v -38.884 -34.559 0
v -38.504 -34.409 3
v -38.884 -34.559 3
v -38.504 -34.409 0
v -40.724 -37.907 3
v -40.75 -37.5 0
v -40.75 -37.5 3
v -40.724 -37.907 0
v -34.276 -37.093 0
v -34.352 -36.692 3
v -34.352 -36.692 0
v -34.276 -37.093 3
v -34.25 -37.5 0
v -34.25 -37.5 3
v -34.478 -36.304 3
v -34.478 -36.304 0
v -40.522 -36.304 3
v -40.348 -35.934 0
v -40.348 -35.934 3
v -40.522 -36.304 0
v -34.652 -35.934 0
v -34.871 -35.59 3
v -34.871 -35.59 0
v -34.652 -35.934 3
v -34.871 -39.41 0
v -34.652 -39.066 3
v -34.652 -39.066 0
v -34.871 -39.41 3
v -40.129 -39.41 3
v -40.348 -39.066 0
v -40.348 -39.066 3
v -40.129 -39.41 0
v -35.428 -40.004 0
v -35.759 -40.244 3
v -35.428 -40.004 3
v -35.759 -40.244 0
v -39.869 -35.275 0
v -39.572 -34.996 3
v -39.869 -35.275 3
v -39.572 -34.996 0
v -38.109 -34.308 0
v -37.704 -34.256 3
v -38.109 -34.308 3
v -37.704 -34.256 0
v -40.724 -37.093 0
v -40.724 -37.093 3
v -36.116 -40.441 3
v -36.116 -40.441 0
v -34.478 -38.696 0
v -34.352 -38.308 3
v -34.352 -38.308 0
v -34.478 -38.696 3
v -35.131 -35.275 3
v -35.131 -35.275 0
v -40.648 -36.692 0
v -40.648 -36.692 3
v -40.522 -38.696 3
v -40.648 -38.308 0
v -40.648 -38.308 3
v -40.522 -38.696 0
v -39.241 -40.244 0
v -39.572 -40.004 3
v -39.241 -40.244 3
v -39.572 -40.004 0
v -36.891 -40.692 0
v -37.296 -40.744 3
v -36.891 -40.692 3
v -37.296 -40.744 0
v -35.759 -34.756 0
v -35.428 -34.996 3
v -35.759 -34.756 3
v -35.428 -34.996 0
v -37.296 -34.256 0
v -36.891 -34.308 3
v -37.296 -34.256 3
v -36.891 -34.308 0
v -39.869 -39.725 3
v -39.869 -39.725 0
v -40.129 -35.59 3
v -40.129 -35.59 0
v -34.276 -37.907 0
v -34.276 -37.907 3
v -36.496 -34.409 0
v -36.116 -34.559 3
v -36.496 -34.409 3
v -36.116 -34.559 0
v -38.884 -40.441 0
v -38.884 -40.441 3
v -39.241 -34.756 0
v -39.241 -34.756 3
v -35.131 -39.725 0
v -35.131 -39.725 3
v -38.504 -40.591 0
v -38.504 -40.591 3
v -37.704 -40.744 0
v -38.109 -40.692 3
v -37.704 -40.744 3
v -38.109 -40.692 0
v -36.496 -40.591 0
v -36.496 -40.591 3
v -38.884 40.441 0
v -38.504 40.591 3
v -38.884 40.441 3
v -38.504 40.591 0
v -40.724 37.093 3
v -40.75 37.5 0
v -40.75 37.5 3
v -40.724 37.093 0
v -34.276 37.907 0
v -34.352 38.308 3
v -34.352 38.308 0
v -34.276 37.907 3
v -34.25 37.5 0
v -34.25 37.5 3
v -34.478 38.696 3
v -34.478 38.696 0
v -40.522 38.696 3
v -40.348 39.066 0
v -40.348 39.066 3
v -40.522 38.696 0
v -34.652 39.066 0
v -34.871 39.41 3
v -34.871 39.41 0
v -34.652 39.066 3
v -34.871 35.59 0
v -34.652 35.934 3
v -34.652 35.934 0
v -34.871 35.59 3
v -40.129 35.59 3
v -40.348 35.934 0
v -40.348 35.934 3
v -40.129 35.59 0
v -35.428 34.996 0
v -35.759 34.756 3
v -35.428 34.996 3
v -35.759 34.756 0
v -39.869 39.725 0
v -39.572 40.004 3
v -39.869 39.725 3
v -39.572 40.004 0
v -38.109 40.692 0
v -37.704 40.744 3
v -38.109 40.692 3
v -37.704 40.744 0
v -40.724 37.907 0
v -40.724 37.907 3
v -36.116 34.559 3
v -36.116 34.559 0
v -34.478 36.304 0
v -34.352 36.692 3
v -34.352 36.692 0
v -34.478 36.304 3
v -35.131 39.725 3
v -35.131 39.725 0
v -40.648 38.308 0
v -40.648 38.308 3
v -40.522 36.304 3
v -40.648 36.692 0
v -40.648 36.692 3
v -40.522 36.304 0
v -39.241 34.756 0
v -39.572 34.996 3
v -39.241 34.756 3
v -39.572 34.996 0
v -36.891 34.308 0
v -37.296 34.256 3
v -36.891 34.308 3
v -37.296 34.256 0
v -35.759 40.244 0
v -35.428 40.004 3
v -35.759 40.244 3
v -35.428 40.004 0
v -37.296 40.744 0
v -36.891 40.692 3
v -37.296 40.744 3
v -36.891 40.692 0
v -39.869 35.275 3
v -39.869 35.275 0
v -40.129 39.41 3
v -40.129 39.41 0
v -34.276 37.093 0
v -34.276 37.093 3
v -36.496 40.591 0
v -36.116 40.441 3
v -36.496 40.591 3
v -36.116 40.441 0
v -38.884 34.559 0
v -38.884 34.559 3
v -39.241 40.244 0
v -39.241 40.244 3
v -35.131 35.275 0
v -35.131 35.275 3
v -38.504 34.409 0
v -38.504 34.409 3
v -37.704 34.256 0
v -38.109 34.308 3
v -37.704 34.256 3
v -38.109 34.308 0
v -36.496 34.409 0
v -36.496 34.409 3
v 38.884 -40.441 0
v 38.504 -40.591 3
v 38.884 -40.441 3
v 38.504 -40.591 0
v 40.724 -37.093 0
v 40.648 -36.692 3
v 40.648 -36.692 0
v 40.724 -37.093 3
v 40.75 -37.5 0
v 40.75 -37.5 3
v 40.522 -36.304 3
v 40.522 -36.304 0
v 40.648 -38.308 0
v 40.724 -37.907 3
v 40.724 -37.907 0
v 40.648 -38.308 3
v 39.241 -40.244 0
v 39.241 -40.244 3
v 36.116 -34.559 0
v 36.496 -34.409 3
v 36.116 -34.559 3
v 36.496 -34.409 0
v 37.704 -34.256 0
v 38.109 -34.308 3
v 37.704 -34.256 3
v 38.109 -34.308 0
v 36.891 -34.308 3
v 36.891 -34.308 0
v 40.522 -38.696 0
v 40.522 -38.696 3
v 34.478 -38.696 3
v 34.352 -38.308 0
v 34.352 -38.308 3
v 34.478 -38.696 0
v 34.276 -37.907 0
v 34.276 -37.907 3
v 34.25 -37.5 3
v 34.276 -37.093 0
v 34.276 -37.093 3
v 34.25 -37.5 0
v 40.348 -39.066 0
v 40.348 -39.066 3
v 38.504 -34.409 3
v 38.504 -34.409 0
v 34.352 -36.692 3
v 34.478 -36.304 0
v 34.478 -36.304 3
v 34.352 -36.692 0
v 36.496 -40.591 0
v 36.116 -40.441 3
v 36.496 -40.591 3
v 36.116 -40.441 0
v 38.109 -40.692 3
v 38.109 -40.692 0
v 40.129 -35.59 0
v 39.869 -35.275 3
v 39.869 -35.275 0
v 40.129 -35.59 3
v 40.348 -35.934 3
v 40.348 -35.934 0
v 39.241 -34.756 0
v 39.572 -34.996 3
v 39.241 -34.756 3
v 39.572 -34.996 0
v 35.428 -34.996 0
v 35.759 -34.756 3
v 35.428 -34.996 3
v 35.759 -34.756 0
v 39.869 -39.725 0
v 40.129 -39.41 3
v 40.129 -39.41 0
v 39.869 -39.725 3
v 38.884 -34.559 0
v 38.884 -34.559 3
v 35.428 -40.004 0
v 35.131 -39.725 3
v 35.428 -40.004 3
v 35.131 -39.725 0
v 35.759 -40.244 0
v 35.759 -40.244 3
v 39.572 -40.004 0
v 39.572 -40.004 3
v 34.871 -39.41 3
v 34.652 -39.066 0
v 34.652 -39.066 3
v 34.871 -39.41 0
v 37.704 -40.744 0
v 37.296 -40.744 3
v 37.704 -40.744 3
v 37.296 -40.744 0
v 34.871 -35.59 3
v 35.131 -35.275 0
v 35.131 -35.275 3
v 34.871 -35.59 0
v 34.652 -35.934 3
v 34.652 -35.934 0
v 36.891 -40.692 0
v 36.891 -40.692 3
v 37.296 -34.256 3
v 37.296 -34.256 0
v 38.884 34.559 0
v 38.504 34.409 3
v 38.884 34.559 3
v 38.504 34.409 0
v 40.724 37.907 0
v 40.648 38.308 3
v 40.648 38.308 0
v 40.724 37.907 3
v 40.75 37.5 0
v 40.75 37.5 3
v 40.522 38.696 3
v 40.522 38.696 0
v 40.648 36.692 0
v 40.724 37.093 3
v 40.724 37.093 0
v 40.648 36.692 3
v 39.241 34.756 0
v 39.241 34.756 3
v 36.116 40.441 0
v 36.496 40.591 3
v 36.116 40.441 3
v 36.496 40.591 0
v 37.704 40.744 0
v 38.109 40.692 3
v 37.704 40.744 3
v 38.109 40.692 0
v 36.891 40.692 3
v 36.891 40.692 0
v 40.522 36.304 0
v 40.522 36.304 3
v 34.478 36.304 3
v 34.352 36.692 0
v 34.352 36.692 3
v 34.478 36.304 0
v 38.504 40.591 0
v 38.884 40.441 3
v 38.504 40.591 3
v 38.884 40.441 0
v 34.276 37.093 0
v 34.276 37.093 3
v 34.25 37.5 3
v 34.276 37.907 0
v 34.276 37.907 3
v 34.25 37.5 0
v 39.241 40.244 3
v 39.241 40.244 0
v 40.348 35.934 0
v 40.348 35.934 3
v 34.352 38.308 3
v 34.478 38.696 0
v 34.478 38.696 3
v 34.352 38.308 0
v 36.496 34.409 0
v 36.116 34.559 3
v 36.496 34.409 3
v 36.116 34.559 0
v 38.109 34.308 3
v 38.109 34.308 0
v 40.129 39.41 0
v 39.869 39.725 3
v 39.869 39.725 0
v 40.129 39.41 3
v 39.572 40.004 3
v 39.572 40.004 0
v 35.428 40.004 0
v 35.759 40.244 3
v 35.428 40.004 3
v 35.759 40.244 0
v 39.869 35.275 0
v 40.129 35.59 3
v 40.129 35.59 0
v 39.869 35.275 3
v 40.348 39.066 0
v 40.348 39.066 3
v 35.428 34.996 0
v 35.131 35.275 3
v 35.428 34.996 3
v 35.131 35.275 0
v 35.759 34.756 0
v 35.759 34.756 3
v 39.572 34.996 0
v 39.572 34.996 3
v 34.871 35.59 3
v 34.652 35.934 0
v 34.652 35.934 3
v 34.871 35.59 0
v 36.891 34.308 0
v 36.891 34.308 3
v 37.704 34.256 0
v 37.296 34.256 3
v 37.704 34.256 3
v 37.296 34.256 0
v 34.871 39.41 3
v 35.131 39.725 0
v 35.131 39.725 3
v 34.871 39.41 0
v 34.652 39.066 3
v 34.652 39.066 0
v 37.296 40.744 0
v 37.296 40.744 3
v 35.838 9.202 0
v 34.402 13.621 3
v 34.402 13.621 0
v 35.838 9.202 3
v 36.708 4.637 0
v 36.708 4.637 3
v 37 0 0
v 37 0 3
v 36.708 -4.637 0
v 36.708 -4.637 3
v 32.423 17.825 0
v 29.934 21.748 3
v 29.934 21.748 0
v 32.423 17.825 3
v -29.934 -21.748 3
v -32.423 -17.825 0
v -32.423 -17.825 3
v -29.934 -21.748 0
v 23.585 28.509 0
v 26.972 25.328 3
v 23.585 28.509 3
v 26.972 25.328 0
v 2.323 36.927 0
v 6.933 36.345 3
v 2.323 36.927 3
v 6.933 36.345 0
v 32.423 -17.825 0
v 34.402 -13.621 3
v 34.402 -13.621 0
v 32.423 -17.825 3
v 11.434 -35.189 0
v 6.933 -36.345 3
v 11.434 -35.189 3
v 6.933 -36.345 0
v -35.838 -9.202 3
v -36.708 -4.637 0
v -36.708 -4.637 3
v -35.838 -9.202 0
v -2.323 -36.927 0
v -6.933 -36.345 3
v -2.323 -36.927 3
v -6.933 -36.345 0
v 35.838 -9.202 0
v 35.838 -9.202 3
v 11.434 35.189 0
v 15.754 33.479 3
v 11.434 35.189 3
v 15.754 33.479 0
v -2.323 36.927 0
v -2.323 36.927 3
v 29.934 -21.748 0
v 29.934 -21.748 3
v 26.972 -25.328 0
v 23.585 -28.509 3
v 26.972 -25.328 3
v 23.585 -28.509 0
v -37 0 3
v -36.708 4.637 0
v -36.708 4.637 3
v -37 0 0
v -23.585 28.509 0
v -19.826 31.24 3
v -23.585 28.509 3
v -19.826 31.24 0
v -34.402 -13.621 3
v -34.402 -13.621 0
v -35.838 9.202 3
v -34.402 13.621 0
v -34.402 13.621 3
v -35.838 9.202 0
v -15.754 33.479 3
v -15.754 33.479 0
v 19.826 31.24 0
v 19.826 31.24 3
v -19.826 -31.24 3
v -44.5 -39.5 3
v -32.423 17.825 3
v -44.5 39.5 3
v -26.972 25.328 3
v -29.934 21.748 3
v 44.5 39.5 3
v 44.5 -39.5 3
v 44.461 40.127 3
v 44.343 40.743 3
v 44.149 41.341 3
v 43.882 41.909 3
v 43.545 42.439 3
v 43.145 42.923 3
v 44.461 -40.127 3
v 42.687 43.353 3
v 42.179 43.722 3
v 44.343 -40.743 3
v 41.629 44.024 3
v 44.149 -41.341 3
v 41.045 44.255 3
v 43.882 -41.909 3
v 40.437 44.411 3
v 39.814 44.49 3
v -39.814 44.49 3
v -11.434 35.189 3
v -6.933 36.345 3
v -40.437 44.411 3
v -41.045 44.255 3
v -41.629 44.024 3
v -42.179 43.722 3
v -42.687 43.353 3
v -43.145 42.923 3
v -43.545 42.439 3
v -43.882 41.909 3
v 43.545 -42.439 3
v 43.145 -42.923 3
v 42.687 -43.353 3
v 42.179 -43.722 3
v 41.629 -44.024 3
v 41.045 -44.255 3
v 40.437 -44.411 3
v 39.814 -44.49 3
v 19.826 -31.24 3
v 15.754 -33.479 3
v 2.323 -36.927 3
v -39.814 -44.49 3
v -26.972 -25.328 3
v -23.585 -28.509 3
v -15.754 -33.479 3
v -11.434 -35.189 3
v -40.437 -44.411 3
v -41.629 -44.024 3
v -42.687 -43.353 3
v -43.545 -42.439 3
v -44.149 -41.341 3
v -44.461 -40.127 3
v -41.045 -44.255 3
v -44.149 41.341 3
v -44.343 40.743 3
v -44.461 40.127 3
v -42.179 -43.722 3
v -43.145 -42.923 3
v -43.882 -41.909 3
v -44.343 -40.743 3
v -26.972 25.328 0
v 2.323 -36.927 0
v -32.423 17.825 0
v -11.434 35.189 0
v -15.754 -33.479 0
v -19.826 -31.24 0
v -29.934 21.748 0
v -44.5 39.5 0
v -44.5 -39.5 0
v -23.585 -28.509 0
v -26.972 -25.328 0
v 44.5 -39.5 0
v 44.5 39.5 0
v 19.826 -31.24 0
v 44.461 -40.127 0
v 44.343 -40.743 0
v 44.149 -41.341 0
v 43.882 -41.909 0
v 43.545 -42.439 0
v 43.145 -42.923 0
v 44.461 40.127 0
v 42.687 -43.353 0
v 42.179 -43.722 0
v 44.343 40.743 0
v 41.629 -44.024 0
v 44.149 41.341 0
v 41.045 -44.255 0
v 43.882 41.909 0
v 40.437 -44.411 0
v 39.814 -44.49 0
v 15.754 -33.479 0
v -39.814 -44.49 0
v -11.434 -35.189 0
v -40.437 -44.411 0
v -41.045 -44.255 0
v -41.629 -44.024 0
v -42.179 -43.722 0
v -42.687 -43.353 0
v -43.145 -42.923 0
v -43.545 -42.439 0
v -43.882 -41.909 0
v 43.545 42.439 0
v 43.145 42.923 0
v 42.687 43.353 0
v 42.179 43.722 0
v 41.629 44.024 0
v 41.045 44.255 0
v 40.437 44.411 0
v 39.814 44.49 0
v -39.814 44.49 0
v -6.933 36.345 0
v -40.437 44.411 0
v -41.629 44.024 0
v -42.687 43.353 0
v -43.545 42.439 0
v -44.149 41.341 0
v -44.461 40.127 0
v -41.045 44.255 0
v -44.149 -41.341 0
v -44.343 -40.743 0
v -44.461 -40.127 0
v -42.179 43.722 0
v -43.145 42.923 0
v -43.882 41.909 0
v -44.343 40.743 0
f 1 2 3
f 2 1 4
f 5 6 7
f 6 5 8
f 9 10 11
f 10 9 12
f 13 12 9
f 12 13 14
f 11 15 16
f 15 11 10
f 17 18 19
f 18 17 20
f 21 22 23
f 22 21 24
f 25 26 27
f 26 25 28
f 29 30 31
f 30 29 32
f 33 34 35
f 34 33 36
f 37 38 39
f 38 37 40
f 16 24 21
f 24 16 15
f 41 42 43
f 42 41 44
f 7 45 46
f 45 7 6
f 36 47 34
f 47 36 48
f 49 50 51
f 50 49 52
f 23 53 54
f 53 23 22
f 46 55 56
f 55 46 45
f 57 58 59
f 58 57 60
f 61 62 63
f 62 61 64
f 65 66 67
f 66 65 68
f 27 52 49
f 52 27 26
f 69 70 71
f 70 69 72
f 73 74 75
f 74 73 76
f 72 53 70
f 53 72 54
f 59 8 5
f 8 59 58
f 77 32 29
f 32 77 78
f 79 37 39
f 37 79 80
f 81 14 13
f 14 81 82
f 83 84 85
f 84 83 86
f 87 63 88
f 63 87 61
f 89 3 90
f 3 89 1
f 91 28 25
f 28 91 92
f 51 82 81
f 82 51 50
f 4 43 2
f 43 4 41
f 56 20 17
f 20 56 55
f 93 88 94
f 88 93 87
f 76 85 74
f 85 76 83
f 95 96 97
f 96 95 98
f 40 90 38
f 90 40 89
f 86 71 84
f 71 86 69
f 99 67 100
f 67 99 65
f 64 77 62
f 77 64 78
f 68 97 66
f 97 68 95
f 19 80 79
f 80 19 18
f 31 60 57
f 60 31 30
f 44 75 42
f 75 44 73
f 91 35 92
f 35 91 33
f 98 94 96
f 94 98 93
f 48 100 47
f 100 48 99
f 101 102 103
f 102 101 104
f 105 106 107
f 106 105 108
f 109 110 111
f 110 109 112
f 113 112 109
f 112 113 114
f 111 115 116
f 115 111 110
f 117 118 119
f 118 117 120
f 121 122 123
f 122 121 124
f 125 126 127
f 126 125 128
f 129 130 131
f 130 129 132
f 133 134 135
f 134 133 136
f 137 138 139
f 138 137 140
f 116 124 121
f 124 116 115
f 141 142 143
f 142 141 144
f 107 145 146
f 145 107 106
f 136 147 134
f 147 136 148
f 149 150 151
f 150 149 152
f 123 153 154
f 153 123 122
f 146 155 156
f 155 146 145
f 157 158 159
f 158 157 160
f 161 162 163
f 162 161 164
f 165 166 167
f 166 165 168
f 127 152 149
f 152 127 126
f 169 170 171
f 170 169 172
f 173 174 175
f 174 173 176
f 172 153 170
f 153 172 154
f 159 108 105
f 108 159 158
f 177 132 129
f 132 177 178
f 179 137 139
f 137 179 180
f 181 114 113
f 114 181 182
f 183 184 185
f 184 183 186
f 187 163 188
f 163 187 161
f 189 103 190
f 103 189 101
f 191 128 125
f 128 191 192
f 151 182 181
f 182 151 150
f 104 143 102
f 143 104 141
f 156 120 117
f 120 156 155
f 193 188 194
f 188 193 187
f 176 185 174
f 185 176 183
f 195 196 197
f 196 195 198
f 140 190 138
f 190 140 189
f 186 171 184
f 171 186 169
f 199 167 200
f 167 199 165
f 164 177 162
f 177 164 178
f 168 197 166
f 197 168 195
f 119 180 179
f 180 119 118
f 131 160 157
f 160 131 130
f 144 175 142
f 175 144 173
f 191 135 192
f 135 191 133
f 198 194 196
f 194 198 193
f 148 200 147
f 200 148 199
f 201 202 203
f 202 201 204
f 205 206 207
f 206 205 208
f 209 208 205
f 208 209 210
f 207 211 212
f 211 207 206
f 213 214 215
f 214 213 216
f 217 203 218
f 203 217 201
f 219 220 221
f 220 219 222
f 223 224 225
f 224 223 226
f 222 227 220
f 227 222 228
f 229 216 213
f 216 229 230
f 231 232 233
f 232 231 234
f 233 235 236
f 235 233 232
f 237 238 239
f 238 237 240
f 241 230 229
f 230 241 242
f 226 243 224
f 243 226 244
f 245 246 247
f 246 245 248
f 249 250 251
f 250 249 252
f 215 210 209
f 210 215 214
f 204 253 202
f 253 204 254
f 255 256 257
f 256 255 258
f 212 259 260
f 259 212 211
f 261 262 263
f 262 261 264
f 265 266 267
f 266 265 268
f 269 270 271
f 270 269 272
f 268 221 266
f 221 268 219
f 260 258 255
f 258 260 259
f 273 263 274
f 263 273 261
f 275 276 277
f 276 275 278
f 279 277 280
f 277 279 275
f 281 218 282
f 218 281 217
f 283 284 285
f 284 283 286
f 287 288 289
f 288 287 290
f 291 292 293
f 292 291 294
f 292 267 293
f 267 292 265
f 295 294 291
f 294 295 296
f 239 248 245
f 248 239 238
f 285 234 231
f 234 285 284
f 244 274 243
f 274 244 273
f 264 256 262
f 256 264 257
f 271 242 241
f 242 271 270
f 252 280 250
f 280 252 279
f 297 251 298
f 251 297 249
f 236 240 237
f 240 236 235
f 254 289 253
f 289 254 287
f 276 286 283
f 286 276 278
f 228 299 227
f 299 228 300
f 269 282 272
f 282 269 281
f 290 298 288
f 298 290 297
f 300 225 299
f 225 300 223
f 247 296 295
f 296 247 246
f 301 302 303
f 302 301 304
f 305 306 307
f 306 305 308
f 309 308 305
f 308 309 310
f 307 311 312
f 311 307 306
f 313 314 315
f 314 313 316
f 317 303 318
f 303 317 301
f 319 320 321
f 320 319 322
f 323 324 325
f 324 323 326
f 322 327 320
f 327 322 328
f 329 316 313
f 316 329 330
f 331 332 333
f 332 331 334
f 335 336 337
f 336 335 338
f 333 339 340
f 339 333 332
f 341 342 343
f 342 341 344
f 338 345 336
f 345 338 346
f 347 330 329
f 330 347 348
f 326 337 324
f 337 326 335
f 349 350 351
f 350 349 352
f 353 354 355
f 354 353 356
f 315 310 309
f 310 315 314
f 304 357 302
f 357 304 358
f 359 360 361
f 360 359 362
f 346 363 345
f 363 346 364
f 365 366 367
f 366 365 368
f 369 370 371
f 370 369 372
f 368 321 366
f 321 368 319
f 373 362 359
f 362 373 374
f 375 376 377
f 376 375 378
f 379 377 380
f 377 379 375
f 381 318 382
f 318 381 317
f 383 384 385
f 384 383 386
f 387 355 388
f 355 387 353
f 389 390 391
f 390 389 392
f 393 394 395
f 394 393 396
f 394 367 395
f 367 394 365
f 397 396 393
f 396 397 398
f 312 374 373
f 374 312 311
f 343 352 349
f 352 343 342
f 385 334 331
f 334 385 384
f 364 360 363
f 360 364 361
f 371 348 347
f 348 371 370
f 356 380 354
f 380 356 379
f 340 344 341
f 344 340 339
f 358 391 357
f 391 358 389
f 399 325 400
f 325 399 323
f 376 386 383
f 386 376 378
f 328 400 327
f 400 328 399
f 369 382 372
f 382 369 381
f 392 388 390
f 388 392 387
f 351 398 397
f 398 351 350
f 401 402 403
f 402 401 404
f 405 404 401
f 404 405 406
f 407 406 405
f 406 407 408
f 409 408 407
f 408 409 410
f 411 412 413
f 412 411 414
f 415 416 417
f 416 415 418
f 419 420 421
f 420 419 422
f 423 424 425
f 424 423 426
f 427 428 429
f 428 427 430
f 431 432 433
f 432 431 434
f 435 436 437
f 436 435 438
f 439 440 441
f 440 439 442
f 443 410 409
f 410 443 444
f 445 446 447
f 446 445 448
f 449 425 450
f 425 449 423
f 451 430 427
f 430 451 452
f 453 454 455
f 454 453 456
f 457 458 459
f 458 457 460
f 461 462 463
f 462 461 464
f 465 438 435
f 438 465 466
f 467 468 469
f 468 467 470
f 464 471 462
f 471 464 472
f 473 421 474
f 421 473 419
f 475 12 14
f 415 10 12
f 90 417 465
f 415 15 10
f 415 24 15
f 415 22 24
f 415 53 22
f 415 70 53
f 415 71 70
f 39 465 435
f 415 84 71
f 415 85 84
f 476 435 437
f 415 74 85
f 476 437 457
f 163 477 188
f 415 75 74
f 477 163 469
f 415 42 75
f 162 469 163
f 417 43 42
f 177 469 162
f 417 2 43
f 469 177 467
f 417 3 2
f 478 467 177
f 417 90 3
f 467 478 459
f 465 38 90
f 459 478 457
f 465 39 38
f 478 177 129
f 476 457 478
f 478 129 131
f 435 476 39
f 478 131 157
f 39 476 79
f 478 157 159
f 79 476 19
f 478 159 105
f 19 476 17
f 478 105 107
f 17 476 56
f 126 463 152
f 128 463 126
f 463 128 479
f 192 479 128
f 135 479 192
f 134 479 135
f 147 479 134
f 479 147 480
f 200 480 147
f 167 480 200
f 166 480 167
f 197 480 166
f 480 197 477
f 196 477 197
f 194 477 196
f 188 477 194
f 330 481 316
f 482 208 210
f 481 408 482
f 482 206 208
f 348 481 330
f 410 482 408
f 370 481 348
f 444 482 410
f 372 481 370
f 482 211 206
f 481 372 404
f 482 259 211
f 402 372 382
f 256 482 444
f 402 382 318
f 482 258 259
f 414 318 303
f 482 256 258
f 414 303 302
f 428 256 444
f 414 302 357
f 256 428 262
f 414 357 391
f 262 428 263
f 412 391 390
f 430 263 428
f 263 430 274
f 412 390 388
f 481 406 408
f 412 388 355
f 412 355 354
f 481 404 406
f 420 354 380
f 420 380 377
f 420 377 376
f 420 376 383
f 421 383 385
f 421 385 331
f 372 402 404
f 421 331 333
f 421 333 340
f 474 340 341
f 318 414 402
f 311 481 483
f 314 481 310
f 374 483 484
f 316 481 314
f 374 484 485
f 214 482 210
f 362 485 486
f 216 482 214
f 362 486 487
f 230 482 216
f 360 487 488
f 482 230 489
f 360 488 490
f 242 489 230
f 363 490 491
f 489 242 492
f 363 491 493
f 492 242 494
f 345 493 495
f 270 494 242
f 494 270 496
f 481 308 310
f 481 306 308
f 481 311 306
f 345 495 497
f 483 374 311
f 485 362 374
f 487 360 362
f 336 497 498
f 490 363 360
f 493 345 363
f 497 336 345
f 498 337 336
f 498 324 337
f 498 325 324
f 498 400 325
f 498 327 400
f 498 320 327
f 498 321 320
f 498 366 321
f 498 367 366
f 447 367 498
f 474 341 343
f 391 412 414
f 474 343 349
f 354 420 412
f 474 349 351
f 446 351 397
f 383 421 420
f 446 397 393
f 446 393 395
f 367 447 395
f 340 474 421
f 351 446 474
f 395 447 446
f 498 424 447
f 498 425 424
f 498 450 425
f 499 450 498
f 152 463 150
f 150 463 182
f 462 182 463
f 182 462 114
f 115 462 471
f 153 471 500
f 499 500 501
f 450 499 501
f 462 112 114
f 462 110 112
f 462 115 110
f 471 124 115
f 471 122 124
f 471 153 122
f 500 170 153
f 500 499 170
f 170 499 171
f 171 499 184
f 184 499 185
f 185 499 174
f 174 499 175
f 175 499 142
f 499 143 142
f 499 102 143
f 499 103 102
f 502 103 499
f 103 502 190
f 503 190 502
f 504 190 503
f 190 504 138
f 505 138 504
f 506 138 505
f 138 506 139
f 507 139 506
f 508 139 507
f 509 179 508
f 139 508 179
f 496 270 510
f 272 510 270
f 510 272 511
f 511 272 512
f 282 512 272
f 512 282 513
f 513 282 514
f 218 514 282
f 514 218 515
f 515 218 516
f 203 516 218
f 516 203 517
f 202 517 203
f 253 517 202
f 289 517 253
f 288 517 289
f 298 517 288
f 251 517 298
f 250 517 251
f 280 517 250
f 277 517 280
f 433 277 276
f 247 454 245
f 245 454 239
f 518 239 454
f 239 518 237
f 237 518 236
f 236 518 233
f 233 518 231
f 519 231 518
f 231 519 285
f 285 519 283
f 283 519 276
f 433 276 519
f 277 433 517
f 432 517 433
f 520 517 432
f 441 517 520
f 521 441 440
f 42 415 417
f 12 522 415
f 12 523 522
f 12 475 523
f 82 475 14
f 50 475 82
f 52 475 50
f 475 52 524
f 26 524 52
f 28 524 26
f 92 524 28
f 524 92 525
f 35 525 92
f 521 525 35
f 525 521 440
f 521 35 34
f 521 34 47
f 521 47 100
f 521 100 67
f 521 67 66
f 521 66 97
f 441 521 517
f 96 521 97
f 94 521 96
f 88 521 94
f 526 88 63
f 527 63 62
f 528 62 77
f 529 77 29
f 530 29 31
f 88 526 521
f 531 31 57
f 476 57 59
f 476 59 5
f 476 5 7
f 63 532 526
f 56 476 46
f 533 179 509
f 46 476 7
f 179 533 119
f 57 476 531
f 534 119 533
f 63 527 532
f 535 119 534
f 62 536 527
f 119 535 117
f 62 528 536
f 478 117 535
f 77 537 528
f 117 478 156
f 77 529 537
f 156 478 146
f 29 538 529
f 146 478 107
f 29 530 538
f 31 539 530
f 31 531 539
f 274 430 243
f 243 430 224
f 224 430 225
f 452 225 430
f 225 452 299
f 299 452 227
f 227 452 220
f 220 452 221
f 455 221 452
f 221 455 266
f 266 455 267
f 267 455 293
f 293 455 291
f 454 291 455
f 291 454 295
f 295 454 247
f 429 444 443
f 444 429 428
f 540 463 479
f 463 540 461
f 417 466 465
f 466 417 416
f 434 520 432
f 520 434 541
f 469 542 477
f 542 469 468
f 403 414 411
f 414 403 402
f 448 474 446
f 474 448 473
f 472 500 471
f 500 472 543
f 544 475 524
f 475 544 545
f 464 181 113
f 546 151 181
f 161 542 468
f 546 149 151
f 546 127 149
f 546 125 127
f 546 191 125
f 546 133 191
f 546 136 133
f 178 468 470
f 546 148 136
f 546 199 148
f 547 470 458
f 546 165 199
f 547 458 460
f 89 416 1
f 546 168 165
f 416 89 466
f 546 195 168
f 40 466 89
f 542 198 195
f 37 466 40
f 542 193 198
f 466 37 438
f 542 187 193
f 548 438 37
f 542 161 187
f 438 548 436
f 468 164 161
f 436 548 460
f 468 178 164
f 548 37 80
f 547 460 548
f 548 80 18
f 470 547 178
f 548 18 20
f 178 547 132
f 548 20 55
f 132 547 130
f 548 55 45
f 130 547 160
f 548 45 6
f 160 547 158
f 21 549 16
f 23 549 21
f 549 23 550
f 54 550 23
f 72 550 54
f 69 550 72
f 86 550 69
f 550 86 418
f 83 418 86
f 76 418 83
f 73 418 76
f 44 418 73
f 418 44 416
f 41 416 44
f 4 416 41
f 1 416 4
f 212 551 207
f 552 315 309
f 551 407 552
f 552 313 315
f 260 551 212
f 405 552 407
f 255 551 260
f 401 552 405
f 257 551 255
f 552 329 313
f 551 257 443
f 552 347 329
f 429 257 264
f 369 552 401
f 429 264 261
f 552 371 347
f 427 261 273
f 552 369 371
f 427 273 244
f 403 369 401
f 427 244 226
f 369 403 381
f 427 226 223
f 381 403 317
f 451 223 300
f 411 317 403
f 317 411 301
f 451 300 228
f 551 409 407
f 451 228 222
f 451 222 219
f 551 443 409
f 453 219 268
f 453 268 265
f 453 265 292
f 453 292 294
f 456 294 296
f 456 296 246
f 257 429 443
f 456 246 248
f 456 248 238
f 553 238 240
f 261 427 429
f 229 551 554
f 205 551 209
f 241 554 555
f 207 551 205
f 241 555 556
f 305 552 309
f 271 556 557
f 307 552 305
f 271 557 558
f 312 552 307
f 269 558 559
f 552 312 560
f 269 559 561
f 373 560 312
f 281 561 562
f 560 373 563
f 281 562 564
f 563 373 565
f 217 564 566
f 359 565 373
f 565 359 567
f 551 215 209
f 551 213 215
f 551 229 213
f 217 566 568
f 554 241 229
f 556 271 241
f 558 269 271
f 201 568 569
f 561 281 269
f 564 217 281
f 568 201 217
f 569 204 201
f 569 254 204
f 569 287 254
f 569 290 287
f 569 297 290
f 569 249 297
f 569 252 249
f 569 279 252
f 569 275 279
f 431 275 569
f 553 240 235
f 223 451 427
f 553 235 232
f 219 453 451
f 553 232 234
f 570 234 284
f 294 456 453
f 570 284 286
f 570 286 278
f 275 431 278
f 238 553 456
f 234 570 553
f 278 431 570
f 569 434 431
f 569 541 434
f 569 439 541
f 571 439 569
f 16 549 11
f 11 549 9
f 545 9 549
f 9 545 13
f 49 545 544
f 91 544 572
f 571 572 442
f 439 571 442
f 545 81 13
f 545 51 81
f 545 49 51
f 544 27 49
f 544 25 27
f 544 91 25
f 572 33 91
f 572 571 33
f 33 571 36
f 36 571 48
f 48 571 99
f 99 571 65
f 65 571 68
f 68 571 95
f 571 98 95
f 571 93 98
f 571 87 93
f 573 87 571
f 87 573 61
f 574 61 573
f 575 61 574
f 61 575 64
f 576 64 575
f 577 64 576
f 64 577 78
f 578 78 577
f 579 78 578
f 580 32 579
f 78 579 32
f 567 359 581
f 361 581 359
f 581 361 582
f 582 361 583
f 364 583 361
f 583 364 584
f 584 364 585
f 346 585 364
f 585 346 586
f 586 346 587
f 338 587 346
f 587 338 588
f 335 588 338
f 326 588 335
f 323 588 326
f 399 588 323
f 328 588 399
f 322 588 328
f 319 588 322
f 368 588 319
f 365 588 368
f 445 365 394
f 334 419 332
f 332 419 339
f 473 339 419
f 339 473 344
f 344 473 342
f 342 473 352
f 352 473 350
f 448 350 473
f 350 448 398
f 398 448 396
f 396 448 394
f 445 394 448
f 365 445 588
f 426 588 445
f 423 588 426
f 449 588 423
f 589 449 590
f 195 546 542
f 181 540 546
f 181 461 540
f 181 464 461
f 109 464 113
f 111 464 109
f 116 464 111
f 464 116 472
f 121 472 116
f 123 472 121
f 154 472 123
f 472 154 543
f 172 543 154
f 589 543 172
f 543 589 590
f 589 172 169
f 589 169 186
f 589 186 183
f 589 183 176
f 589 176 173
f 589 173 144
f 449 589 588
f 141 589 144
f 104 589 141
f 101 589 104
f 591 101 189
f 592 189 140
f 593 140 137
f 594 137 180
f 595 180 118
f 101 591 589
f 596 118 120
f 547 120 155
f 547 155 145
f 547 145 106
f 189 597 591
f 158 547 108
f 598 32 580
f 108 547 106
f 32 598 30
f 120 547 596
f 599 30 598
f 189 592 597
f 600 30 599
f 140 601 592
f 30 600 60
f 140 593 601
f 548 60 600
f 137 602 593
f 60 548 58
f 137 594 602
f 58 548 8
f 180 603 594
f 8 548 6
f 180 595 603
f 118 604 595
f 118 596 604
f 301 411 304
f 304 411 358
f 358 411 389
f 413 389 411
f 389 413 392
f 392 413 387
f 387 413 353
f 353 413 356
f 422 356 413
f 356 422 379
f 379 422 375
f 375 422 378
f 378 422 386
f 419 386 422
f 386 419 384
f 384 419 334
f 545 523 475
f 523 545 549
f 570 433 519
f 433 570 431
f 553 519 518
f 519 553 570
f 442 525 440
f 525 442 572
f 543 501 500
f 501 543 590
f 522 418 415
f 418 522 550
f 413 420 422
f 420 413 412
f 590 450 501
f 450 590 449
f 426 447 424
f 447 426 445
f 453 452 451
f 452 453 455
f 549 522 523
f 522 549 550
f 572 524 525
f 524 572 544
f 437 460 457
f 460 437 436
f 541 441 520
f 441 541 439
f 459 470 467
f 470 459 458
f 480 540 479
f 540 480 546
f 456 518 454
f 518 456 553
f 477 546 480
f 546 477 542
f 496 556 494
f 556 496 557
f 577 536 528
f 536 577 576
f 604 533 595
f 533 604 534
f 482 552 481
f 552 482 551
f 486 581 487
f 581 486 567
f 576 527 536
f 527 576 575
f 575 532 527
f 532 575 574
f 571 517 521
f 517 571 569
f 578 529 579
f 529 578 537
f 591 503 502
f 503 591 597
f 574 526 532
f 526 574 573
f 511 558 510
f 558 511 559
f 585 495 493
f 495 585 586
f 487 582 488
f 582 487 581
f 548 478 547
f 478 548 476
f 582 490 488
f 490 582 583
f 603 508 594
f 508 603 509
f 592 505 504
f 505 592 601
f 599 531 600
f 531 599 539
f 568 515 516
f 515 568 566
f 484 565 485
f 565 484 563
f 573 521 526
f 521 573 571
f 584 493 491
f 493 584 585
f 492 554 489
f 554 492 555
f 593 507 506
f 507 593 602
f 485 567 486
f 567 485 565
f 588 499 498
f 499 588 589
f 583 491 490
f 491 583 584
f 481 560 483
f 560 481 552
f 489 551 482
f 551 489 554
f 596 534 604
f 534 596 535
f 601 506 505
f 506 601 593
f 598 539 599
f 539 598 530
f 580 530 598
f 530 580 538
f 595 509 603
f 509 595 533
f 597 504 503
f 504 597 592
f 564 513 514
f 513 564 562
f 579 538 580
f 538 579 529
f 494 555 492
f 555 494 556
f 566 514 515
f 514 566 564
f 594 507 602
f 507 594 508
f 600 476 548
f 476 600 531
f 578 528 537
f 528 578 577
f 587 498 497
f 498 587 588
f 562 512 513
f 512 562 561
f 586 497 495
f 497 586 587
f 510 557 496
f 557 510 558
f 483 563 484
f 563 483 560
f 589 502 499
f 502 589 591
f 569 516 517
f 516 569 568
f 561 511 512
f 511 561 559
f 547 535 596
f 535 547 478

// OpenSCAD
$fn = 50;


difference() {
	union() {
		hull() {
			translate(v = [-39.5000000000, 39.5000000000, 0]) {
				cylinder(h = 3, r = 5);
			}
			translate(v = [39.5000000000, 39.5000000000, 0]) {
				cylinder(h = 3, r = 5);
			}
			translate(v = [-39.5000000000, -39.5000000000, 0]) {
				cylinder(h = 3, r = 5);
			}
			translate(v = [39.5000000000, -39.5000000000, 0]) {
				cylinder(h = 3, r = 5);
			}
		}
	}
	union() {
		#translate(v = [-37.5000000000, -37.5000000000, -100.0000000000]) {
			cylinder(h = 200, r = 3.2500000000);
		}
		#translate(v = [-37.5000000000, 37.5000000000, -100.0000000000]) {
			cylinder(h = 200, r = 3.2500000000);
		}
		#translate(v = [37.5000000000, -37.5000000000, -100.0000000000]) {
			cylinder(h = 200, r = 3.2500000000);
		}
		#translate(v = [37.5000000000, 37.5000000000, -100.0000000000]) {
			cylinder(h = 200, r = 3.2500000000);
		}
		#cylinder(h = 3, r = 37.0000000000);
	}
}
